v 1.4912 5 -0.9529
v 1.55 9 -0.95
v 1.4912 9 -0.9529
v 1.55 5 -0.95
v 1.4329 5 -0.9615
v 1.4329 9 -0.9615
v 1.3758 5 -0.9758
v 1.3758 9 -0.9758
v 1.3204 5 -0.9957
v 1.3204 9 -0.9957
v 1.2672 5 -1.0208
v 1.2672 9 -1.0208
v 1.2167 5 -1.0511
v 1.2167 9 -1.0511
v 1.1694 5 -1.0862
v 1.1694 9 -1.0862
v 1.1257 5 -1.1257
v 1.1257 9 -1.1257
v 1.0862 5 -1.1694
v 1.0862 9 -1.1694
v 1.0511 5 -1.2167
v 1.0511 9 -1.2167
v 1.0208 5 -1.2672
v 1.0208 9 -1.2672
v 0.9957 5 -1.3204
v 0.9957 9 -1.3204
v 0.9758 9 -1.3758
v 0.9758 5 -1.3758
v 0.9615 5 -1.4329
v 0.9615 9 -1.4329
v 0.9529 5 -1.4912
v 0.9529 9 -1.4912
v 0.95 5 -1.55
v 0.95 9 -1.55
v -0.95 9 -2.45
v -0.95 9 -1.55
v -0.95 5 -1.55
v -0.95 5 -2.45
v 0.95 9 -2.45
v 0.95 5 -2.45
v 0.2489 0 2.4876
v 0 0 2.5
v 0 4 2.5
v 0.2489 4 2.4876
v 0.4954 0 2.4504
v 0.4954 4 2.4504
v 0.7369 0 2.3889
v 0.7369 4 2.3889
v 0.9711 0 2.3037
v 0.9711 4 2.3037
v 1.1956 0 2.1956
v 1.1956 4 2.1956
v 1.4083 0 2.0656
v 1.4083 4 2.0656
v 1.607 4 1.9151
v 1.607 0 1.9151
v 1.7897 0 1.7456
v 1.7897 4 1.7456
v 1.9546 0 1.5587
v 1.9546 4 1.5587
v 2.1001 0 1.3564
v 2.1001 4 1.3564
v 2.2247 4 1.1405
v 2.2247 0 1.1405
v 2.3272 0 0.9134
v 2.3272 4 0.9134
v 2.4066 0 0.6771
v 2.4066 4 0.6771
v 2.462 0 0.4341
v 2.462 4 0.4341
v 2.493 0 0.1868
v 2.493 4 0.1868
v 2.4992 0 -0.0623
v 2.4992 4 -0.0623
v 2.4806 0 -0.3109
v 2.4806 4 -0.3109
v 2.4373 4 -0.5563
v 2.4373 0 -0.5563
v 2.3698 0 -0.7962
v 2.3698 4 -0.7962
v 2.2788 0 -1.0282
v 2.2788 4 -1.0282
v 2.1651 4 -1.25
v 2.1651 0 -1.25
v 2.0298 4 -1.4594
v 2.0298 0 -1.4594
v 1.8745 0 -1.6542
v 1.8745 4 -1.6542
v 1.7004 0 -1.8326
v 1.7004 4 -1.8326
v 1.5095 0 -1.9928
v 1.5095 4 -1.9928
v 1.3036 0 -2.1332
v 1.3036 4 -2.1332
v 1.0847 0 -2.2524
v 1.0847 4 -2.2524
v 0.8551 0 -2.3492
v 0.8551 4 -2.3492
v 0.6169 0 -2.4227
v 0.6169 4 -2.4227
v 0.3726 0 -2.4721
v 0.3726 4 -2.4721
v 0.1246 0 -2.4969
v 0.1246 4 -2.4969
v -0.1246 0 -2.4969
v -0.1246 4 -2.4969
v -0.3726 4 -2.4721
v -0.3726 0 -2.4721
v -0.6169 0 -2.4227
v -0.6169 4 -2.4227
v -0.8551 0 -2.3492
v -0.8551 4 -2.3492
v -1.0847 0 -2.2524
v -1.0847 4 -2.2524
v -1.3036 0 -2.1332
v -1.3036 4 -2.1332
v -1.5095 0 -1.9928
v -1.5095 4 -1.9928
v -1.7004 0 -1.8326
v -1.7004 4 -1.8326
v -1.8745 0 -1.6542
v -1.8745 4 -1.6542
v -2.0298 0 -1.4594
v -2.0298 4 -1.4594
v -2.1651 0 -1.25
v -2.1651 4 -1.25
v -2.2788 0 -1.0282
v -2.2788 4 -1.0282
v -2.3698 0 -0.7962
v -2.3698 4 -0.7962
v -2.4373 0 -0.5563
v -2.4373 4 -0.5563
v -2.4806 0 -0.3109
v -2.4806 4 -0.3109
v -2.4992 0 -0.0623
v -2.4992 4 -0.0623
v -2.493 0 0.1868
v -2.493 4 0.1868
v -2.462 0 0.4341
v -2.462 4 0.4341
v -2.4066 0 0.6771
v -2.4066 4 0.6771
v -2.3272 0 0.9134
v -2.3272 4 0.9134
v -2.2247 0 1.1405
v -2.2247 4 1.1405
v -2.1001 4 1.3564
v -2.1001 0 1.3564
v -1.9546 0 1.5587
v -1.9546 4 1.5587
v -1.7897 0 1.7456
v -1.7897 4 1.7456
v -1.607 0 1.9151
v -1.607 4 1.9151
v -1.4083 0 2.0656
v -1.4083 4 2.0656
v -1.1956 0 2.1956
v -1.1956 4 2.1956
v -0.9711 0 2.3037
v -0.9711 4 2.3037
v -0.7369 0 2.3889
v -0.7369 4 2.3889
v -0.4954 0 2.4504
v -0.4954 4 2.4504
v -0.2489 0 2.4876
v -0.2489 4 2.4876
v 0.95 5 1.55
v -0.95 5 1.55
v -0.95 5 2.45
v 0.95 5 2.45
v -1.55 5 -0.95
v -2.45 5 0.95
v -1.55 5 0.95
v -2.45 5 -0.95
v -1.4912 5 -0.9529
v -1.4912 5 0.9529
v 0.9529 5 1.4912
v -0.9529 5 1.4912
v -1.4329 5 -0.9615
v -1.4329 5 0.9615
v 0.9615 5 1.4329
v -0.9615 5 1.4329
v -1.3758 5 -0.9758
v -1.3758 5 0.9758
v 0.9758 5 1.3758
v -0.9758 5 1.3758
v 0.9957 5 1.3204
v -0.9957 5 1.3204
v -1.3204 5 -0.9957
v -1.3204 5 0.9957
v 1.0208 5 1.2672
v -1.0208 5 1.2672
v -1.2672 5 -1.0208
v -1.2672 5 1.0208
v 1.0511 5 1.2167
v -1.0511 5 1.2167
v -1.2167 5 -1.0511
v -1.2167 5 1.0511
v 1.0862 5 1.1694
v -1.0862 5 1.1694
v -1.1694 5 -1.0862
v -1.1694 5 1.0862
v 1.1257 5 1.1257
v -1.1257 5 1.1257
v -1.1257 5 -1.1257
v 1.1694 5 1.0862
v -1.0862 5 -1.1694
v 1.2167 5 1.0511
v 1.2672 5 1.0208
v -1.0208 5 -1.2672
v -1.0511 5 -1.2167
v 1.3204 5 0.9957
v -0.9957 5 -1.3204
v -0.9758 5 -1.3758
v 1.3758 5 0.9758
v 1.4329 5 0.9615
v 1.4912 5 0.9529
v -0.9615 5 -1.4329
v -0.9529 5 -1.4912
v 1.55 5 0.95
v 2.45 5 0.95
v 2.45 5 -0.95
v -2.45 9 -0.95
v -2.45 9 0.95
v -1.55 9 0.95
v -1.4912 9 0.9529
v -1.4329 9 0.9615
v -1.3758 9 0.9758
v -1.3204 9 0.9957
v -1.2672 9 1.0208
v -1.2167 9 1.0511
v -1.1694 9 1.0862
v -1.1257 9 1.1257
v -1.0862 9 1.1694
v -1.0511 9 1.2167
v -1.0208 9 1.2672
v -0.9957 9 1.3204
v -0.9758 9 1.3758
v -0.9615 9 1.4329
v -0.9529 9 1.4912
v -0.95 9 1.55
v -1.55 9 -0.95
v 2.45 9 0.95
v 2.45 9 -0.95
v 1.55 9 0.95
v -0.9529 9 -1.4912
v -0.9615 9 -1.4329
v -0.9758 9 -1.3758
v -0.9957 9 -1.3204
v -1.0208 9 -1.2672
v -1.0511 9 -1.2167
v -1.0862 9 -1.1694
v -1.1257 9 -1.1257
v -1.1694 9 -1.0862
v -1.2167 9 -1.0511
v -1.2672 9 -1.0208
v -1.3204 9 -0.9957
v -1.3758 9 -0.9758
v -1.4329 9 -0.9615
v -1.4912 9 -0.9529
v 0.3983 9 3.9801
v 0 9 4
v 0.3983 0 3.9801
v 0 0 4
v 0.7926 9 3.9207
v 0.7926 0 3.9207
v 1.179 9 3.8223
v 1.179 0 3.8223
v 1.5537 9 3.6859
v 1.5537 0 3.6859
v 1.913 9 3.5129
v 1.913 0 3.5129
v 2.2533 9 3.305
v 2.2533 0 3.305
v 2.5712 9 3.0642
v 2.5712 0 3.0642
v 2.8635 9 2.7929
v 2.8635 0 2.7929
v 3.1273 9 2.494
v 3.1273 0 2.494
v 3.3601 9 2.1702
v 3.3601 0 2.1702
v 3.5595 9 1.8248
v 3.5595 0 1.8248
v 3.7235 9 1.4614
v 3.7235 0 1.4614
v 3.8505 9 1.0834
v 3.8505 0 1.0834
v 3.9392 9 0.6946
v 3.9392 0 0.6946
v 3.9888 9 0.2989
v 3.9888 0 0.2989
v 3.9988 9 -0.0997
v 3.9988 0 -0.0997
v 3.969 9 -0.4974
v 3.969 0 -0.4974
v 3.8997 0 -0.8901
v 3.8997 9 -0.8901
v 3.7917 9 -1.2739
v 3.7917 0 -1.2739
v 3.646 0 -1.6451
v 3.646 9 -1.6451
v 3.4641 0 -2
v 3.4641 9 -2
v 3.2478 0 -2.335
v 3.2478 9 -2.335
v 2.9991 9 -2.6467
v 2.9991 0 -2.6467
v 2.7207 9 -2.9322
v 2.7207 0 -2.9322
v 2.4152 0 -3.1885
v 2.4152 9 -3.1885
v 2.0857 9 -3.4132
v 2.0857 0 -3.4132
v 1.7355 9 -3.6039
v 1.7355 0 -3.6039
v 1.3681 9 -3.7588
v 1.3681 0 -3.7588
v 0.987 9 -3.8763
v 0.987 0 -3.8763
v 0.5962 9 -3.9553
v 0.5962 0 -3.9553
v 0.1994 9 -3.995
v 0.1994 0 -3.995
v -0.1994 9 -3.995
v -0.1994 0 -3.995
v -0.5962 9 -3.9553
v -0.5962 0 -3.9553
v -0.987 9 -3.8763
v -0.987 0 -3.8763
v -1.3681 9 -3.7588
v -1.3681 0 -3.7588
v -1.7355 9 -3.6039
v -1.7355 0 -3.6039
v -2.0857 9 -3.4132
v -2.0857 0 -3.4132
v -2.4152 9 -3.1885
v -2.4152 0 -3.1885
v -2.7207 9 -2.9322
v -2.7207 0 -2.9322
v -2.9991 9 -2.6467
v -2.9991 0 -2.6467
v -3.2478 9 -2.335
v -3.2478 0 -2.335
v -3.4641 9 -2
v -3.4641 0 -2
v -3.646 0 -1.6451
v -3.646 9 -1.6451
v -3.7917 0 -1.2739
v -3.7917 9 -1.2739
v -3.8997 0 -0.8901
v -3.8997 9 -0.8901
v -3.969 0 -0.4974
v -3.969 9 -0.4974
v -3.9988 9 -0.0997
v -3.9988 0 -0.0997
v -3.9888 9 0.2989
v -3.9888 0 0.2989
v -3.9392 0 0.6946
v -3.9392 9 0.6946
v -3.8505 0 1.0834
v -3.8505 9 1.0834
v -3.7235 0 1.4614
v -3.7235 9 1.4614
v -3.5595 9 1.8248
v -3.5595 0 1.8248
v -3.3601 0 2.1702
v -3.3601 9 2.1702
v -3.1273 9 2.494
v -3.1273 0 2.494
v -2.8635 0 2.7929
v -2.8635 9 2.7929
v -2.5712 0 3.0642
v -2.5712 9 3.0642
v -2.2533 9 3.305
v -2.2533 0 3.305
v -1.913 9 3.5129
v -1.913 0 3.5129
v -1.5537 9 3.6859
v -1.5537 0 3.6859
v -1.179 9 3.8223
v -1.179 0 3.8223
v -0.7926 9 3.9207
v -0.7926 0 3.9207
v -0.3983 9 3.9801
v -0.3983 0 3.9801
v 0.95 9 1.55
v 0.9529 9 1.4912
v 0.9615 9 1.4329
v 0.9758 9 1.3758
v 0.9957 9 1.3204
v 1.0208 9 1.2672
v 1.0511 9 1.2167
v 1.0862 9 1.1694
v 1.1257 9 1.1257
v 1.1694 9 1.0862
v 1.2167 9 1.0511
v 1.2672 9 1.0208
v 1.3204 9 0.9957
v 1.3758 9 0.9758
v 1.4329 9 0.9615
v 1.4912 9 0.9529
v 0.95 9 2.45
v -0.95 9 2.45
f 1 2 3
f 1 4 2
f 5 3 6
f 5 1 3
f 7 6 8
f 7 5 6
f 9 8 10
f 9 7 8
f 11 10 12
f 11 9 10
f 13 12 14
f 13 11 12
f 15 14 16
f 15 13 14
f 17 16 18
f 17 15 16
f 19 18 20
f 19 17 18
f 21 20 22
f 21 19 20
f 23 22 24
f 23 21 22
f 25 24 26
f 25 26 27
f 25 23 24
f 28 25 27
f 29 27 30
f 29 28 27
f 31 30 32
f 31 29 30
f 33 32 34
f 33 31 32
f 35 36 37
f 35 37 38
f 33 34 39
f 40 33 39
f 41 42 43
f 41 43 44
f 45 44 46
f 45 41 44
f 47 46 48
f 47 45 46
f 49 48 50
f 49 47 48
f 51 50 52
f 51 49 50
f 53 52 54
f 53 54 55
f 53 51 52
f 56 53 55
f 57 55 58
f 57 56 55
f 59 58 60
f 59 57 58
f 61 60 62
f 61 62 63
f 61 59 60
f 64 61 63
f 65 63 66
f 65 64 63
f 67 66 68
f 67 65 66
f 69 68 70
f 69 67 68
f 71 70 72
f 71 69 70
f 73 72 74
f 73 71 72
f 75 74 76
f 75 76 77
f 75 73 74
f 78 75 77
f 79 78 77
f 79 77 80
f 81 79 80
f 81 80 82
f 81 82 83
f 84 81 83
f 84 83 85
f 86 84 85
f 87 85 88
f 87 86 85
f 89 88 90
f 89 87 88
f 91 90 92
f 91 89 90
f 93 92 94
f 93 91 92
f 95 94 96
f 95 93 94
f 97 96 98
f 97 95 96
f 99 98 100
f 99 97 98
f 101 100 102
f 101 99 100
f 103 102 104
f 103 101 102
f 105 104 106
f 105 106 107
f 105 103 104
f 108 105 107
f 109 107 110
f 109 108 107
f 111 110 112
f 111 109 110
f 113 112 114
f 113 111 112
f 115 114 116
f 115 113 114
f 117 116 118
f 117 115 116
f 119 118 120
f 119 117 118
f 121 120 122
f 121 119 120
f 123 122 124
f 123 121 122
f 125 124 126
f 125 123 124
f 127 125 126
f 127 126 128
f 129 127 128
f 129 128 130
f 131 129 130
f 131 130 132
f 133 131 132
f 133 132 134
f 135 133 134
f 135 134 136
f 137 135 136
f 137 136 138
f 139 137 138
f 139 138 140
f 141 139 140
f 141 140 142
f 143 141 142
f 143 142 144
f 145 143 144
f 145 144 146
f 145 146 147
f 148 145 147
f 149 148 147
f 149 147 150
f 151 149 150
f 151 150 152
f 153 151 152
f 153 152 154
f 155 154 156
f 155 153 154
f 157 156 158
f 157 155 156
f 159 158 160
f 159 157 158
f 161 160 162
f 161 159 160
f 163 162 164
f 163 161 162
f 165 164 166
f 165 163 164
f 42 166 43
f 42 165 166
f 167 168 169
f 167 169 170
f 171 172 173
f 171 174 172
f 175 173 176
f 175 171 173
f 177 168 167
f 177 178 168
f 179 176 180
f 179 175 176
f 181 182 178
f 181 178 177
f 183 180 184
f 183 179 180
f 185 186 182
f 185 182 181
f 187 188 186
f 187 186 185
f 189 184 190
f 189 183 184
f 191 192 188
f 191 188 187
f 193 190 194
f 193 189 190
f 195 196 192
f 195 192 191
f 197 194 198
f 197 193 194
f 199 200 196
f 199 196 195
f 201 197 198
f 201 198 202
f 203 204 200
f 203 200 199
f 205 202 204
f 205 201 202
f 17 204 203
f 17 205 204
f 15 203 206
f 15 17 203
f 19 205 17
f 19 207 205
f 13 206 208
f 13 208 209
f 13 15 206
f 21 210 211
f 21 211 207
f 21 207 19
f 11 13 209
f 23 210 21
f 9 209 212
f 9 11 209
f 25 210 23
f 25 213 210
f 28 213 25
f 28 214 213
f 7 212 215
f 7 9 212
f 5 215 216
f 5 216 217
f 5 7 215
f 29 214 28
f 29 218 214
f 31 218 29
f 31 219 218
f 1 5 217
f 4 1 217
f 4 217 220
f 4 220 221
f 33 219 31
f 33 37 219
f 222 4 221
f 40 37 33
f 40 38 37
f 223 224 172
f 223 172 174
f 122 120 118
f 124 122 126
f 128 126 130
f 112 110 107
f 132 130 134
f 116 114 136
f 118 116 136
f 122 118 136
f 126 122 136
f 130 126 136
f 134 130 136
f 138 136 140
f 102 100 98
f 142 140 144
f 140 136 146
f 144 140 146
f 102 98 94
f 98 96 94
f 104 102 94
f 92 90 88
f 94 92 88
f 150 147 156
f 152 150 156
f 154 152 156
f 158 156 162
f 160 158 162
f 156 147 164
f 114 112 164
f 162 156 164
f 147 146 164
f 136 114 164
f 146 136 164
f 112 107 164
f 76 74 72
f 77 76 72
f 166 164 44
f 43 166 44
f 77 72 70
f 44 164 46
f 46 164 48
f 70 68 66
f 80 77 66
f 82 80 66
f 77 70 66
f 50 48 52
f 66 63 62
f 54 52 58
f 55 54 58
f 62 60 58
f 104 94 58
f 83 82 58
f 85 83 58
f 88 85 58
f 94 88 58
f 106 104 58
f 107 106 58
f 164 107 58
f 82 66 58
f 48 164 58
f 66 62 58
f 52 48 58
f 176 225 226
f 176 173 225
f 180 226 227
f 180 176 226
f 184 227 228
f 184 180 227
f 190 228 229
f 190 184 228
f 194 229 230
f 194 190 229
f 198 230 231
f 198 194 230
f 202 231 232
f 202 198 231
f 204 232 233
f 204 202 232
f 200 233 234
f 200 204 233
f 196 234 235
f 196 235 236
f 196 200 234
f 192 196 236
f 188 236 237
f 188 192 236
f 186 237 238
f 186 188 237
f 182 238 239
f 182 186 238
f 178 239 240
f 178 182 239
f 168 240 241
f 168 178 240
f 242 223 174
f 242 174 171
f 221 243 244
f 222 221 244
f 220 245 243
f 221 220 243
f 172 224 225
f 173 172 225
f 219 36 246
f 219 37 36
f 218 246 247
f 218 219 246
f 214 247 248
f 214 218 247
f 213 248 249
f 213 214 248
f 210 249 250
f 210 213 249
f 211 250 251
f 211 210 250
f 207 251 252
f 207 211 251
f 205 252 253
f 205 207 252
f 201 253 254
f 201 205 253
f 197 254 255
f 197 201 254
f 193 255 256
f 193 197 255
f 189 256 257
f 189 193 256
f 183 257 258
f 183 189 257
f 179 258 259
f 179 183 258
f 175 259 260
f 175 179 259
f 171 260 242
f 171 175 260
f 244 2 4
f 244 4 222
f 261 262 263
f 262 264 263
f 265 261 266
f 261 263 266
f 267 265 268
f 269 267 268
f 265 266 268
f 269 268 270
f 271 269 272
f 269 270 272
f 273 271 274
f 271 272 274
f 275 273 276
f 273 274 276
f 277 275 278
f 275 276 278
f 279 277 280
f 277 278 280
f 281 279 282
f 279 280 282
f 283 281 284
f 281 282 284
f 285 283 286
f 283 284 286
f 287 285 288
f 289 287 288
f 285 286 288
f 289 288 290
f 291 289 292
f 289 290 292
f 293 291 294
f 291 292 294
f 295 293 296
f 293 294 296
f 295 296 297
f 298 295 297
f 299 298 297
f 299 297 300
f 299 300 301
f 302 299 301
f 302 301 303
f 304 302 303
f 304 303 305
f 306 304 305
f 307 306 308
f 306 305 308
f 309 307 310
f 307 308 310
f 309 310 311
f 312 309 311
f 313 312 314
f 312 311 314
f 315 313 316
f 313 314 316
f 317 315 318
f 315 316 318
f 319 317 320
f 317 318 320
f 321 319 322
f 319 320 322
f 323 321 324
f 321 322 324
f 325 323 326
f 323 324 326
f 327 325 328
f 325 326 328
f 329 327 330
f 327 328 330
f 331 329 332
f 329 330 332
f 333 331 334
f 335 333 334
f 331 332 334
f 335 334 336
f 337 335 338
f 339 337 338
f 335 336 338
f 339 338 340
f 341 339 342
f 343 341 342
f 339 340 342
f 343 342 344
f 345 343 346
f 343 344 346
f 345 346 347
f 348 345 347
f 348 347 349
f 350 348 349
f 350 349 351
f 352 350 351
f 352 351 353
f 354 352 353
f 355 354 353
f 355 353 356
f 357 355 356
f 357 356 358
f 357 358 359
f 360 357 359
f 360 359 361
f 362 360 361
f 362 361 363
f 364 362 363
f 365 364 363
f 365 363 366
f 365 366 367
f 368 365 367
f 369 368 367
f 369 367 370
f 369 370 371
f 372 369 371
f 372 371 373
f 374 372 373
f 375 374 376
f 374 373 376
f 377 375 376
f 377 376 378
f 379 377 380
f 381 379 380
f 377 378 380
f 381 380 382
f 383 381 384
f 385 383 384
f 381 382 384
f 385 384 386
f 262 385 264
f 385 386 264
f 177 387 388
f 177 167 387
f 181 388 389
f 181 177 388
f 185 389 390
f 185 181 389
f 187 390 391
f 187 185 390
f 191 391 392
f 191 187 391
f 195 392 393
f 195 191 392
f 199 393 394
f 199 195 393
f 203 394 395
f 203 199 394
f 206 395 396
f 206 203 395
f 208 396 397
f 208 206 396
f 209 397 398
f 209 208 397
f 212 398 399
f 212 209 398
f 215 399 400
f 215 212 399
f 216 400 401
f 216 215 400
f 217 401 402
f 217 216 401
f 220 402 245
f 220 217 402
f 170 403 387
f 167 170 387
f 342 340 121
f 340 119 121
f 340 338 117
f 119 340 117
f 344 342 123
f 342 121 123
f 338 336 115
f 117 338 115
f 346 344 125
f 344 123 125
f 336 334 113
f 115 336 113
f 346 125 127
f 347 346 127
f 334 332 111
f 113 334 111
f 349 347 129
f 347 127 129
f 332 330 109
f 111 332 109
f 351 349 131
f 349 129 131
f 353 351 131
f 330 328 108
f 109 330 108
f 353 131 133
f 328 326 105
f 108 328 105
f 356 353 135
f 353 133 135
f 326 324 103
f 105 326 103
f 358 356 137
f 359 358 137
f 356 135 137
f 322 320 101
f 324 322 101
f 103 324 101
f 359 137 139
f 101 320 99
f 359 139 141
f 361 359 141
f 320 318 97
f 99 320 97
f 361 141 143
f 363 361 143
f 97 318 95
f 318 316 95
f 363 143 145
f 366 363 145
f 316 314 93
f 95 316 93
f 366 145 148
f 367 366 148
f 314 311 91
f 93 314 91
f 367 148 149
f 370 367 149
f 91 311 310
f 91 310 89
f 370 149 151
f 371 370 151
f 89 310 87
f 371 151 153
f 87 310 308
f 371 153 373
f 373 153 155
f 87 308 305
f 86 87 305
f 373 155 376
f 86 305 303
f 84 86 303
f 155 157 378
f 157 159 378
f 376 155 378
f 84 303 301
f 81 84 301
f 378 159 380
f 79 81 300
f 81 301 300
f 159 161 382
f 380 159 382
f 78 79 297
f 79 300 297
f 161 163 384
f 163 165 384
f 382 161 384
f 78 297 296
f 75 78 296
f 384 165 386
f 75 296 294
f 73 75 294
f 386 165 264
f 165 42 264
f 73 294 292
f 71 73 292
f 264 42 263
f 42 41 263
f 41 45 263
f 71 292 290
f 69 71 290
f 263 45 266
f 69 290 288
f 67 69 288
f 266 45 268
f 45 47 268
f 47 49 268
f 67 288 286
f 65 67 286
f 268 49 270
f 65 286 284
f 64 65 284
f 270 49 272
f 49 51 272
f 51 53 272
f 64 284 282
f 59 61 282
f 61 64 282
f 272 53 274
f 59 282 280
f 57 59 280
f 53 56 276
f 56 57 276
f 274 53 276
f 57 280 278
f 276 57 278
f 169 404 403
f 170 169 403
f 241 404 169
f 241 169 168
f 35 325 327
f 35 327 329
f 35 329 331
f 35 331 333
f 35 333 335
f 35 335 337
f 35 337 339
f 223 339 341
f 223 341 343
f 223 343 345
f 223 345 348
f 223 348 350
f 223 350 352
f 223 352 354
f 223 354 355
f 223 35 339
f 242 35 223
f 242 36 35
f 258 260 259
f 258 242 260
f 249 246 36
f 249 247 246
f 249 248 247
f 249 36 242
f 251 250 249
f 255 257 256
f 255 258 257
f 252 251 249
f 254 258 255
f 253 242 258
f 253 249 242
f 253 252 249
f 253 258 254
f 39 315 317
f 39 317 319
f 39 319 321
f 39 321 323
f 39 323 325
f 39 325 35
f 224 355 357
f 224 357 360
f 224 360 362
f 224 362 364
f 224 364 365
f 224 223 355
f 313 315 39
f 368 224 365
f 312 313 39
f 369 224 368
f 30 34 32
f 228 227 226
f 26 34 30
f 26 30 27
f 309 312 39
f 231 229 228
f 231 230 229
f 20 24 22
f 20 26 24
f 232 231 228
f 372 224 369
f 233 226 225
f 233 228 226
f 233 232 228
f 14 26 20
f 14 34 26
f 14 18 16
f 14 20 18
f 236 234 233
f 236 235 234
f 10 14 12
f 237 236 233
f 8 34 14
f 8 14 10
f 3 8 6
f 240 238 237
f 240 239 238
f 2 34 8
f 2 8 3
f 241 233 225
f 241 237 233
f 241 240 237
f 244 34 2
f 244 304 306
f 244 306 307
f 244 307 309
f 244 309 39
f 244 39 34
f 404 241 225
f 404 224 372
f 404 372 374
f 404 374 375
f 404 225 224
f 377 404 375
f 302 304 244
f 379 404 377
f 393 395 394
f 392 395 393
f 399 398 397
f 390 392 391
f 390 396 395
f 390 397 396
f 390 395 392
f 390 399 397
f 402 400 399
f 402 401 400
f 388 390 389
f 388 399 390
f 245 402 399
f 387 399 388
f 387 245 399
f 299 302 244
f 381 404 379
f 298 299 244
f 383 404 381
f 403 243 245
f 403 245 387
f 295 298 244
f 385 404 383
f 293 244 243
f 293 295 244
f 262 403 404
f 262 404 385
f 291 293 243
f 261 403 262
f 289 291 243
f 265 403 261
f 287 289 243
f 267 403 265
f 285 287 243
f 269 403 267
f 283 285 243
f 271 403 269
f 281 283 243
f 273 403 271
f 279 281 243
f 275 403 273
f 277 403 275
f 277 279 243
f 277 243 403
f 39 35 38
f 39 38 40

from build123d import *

# Parameters (mm, degrees)
SKETCH1_R           = 4
SKETCH1_R_2         = 2.5
BOSS_EXTRUDE1_DEPTH = 4
SKETCH3_R           = 4
BOSS_EXTRUDE2_DEPTH = 5
SKETCH4_W           = 1.5
SKETCH4_H           = 1.9
SKETCH4_W_2         = 1.9
SKETCH4_H_2         = 1.5
CUT_EXTRUDE1_DEPTH  = 4
FILLET1_R           = 0.6


with BuildPart() as part:
    # Sketch1 → Boss-Extrude1 (new body)
    with BuildSketch(Plane(origin=(0, 0, 0), x_dir=(1, 0, 0), z_dir=(0, 1, 0))):
        with Locations(Location((0, 0, 0), (0, 0, 270))):
            Circle(SKETCH1_R)
        with Locations(Location((0, 0, 0), (0, 0, 270))):
            Circle(SKETCH1_R_2, mode=Mode.SUBTRACT)
    extrude(amount=BOSS_EXTRUDE1_DEPTH)

    # Sketch3 → Boss-Extrude2 (add)
    with BuildSketch(Plane(origin=(0, 4, 0), x_dir=(1, 0, 0), z_dir=(0, 1, 0))):
        with Locations(Location((0, 0, 0), (0, 0, 270))):
            Circle(SKETCH3_R)
    extrude(amount=BOSS_EXTRUDE2_DEPTH)

    # Sketch4 → Cut-Extrude1 (cut)
    with BuildSketch(Plane(origin=(0, 9, 0), x_dir=(1, 0, 0), z_dir=(0, 1, 0))):
        with Locations((-1.7, 0)):
            Rectangle(SKETCH4_W, SKETCH4_H)
        with Locations((0, 1.7)):
            Rectangle(SKETCH4_W_2, SKETCH4_H_2)
        with Locations((1.7, 0)):
            Rectangle(SKETCH4_W, SKETCH4_H)
        Rectangle(SKETCH4_W_2, SKETCH4_H)
        with Locations((0, -1.7)):
            Rectangle(SKETCH4_W_2, SKETCH4_H_2)
    extrude(amount=-CUT_EXTRUDE1_DEPTH, mode=Mode.SUBTRACT)

    # Fillet1
    fillet1_edges = [part.edges().sort_by_distance(p)[0] for p in [
        (-0.95, 7, -0.95),
        (0.95, 7, -0.95),
        (0.95, 7, 0.95),
        (-0.95, 7, 0.95),
    ]]
    fillet(fillet1_edges, radius=FILLET1_R)


solid = part.part
